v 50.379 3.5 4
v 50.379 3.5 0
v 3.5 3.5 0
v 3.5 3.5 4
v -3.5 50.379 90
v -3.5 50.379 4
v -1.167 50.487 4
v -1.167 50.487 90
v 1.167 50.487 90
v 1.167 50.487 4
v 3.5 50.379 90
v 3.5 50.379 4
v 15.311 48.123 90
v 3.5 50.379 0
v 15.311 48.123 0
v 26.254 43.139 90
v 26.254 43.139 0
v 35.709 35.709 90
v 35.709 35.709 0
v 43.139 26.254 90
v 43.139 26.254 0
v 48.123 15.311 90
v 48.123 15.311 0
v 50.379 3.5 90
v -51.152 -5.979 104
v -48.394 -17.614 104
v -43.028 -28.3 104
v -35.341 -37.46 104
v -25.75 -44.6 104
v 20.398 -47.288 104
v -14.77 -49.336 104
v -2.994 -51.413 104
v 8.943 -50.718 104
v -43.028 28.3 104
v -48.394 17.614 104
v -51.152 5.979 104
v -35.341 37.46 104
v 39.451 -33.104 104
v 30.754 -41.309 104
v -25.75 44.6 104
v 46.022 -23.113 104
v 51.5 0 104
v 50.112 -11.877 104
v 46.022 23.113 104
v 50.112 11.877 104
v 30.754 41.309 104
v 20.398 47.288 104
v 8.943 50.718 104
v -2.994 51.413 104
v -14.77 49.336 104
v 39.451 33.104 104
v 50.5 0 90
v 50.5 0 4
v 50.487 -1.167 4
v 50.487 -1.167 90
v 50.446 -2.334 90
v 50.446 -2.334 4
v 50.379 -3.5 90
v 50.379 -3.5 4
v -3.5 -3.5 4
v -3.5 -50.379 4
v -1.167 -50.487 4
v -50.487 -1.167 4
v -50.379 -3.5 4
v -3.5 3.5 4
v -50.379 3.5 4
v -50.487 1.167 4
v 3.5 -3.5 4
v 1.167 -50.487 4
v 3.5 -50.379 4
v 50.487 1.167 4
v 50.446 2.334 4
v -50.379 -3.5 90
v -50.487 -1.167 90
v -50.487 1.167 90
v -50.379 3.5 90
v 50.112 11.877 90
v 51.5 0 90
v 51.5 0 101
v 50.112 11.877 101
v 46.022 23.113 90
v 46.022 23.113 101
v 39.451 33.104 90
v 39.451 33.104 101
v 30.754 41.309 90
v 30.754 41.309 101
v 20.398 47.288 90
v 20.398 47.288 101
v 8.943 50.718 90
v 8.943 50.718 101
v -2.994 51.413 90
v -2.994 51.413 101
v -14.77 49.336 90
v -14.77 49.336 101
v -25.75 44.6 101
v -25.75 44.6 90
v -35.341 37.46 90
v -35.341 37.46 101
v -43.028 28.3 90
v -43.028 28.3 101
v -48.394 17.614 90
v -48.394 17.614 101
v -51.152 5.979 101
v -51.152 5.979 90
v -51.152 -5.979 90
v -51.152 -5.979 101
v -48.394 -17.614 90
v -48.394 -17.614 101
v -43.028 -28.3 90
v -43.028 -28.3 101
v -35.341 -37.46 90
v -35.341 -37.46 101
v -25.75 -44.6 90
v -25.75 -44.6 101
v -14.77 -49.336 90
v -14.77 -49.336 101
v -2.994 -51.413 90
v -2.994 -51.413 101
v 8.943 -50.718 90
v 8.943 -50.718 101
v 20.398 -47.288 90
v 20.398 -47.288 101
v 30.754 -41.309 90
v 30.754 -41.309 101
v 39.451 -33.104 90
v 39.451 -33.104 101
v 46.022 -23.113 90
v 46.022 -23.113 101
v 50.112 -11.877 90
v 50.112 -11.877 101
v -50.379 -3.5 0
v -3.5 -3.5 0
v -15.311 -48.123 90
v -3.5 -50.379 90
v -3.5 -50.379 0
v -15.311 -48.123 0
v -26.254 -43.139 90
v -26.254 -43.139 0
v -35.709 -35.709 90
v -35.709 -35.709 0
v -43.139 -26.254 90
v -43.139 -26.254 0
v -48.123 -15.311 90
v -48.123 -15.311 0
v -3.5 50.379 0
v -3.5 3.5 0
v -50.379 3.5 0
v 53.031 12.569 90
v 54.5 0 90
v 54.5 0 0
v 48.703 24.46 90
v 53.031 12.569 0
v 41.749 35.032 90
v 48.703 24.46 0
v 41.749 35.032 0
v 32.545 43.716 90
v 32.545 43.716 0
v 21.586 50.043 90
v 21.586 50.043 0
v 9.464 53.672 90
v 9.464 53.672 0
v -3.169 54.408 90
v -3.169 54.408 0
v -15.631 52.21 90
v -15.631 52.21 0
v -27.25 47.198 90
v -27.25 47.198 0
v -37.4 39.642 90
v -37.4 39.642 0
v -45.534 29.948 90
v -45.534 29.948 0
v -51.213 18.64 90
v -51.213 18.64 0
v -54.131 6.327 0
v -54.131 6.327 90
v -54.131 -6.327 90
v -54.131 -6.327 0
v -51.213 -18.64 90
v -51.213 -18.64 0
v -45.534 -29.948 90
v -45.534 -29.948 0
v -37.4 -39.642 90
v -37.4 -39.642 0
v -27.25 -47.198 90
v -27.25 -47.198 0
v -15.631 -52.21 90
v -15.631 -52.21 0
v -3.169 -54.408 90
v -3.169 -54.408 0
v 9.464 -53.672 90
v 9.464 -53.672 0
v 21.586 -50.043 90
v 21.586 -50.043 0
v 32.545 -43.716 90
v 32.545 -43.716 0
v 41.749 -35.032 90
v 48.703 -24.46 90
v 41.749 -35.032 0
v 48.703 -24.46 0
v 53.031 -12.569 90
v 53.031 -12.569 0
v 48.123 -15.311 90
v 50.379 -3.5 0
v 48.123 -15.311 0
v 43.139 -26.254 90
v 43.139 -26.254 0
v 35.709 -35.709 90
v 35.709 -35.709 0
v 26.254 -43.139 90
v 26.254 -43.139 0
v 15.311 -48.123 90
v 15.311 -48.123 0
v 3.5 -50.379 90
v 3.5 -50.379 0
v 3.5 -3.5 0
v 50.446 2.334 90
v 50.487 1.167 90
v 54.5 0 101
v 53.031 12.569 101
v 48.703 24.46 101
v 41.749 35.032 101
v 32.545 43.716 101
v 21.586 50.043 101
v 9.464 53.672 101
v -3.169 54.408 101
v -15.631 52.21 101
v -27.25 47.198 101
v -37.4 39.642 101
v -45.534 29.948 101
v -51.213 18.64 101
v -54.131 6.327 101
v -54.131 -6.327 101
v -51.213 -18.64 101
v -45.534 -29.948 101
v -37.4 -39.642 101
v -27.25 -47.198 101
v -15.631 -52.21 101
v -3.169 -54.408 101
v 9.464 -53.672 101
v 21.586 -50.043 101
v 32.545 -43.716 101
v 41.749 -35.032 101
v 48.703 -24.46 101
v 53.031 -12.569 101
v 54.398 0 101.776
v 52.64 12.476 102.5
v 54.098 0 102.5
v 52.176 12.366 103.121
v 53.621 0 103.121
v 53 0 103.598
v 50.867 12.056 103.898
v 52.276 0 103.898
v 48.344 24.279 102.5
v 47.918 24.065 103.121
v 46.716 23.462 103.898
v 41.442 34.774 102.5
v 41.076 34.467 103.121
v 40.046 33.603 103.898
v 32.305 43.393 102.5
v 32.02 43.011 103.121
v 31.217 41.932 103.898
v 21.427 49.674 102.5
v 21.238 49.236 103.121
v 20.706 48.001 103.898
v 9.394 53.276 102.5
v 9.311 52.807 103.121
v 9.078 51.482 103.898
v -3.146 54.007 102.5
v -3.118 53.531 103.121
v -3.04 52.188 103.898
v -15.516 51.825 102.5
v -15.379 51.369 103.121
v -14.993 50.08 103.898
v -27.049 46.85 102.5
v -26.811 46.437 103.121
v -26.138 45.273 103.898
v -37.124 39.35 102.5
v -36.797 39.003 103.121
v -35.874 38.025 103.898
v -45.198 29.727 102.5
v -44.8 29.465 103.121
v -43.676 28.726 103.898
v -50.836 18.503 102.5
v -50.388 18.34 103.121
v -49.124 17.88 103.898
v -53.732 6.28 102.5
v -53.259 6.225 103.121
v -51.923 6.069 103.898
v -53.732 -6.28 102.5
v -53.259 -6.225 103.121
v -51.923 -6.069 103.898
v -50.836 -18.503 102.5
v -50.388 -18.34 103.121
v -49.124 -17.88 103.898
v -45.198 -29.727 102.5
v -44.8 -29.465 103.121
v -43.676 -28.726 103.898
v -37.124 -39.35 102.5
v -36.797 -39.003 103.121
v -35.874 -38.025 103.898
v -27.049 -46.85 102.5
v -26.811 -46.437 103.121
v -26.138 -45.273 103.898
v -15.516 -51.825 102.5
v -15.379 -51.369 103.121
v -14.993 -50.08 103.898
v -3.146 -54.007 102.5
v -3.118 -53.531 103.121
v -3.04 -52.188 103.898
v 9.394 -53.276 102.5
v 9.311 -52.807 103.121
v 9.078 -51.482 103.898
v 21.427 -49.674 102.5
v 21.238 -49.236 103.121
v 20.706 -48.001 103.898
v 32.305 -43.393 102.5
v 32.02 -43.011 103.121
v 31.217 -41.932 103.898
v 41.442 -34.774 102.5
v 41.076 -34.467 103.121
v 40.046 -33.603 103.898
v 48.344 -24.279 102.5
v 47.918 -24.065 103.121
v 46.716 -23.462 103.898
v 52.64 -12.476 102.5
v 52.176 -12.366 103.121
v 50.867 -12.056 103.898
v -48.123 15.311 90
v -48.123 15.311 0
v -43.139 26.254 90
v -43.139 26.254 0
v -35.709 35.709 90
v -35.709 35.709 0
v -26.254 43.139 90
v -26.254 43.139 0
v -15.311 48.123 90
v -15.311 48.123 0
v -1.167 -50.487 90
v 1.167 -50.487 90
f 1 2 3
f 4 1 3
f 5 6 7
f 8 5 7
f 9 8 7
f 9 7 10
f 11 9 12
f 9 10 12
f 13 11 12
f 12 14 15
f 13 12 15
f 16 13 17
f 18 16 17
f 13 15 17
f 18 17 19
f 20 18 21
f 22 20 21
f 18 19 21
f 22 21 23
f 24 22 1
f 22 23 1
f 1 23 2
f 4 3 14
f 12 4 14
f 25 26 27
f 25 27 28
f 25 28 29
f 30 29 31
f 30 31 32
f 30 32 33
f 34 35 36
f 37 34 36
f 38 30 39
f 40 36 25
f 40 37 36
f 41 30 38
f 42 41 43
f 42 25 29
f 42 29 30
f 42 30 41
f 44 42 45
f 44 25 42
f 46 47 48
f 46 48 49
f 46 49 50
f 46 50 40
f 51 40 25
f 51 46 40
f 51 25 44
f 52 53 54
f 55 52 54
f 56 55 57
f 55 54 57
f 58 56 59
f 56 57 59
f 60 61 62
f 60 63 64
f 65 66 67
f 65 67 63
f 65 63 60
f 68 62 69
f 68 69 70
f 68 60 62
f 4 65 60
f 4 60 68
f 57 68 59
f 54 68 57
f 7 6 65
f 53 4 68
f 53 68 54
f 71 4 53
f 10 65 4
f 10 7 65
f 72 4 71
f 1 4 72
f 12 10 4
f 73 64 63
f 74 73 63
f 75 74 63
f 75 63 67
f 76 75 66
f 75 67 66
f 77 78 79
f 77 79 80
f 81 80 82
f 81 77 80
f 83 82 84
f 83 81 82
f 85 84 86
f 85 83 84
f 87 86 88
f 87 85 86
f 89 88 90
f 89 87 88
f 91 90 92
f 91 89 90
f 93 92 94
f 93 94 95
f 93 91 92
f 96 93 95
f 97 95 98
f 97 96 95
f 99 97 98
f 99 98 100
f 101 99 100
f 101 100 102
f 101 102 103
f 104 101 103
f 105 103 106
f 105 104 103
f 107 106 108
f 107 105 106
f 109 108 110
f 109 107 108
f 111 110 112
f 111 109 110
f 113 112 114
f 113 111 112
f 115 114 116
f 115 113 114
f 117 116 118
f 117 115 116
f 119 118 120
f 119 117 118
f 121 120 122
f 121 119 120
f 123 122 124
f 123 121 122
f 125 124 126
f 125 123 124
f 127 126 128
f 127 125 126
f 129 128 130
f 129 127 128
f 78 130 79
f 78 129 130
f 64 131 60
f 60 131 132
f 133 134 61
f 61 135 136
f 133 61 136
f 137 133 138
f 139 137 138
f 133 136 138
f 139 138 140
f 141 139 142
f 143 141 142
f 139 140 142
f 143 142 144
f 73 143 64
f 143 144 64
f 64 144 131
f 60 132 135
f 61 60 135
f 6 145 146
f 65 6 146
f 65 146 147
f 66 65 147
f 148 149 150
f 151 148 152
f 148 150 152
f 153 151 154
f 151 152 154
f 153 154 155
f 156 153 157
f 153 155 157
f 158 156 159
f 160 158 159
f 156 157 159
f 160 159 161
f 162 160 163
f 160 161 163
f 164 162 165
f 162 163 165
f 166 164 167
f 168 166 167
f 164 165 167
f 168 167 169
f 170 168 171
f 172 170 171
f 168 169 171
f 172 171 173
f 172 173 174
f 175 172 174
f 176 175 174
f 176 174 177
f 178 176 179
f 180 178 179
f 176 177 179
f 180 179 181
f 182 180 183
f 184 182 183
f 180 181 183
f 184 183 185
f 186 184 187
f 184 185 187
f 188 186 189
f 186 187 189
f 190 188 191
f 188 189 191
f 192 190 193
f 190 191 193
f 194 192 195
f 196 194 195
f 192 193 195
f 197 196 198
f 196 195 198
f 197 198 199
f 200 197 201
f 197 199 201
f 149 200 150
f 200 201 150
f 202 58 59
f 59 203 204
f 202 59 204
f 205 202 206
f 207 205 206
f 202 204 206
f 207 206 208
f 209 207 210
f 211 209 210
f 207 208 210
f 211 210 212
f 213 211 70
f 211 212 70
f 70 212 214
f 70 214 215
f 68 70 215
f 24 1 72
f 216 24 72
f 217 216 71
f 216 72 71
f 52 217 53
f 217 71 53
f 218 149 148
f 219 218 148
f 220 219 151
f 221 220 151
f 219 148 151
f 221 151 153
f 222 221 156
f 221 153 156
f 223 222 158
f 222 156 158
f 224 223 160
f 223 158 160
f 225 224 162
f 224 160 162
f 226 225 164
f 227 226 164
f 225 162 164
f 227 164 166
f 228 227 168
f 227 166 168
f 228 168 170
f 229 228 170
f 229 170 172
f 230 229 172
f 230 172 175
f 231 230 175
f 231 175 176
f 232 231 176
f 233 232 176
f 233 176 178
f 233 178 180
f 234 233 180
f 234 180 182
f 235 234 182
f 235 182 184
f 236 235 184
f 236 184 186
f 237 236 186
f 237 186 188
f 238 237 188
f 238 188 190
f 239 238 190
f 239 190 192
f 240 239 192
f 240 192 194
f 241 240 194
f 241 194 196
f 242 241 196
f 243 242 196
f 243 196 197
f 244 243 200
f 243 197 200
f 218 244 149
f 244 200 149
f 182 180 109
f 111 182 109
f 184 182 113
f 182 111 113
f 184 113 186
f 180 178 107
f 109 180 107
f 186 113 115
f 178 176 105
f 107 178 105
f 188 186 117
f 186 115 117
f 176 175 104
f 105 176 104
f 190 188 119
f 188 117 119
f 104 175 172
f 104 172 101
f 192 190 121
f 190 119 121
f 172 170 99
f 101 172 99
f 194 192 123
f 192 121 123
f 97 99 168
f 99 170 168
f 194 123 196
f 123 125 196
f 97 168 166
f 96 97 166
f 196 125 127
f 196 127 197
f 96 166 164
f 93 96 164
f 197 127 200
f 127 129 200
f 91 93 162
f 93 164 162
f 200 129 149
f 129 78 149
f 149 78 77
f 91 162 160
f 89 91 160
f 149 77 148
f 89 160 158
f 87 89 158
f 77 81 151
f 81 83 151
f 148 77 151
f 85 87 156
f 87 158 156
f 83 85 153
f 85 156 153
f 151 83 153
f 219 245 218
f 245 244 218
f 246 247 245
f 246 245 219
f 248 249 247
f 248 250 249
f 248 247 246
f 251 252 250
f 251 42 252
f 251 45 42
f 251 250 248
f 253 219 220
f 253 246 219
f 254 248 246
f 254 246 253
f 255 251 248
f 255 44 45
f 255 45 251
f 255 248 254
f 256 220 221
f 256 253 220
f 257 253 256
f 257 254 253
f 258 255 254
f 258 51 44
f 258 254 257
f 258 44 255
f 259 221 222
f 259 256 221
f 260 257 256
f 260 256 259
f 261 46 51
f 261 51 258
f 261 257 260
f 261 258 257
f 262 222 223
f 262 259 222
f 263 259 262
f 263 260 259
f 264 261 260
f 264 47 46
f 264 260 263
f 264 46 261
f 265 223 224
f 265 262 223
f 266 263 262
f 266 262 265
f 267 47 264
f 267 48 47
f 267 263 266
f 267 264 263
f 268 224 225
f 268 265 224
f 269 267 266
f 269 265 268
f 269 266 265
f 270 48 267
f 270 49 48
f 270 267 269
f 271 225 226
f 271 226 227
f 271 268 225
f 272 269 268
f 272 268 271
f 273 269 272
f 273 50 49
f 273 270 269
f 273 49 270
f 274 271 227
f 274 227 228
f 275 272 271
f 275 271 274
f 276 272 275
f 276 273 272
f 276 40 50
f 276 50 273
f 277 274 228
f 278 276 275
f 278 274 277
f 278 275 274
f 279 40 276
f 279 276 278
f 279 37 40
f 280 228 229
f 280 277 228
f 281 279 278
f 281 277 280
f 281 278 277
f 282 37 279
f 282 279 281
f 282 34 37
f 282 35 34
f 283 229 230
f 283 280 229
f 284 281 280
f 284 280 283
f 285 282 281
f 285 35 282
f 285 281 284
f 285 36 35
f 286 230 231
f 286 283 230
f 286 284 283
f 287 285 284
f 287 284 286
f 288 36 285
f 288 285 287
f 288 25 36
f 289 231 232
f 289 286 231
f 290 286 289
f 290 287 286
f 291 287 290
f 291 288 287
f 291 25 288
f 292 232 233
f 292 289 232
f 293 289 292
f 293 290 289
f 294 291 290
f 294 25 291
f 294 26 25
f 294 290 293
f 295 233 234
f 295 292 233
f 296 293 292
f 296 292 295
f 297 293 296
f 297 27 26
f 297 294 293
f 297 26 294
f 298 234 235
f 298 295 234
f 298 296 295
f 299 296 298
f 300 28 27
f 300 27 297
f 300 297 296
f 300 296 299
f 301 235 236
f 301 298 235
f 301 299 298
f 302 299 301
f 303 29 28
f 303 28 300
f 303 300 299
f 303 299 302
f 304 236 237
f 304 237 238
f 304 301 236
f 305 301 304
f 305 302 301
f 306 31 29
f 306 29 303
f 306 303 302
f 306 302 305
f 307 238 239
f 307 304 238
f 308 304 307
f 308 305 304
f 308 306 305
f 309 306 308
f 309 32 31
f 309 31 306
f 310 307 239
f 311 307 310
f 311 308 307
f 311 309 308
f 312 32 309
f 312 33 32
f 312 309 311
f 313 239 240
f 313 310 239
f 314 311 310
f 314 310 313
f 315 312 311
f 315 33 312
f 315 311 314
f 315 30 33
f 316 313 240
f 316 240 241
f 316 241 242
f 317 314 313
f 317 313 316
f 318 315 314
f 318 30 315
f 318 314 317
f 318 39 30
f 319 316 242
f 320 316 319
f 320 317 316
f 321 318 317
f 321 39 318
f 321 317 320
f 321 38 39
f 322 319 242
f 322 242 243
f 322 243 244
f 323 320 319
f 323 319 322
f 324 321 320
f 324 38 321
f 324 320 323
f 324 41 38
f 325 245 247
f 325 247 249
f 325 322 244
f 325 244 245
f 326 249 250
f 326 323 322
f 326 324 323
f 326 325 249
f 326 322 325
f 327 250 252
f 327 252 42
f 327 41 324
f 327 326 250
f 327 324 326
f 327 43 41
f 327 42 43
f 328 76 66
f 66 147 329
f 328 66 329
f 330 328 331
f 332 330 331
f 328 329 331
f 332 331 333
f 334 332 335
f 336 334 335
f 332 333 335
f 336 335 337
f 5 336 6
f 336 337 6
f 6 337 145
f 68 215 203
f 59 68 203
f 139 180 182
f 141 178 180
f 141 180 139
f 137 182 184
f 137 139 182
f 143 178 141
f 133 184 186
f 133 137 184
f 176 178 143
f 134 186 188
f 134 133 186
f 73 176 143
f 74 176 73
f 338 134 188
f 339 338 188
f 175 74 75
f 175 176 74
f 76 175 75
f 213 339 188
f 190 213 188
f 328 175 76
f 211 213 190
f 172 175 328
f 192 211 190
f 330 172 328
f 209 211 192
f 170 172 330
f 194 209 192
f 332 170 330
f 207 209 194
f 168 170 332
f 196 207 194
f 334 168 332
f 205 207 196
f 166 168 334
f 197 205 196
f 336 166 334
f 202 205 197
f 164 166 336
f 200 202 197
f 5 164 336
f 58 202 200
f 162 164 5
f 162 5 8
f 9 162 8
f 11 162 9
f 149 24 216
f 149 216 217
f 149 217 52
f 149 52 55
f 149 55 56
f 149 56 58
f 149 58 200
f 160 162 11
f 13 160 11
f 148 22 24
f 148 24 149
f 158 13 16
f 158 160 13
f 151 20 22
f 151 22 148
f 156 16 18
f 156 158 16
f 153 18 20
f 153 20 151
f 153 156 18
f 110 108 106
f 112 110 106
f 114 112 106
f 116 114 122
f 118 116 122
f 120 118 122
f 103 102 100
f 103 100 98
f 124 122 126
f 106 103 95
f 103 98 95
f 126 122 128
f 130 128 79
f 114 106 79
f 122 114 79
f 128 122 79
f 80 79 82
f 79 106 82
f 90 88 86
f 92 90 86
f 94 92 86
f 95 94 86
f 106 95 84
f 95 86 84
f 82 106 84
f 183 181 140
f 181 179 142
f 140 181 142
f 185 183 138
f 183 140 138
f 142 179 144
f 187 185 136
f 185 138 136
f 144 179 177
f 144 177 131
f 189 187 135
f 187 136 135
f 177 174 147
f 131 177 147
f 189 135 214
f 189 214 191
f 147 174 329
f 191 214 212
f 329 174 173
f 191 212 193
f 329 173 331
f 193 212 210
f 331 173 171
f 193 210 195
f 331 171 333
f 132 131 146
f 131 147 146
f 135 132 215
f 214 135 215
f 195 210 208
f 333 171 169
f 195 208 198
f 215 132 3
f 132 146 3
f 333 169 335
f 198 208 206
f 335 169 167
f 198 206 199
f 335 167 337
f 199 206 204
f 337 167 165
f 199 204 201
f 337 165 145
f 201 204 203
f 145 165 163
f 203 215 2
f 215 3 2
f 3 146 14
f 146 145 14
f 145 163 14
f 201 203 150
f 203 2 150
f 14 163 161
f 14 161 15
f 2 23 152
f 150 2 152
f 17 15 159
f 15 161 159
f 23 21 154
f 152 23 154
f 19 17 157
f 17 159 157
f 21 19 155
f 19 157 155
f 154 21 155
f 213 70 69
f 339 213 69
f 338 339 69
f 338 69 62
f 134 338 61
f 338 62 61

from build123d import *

# Parameters (mm, degrees)
F0_R     = 54.5
F1_DEPTH = 90
F0_W     = 7
F0_H     = 7
F2_DEPTH = 4
F3_R     = 54.5
F3_R_2   = 51.5
F4_DEPTH = 11
F5_R     = 54.5
F5_R_2   = 51.5
F5_R_3   = 48.5912547039
F6_DEPTH = 3
F7_R     = 3


# Not quite as in the source:
# - a feature of the source that left no trace in its solid (it failed there, or was rolled back) is left out


with BuildPart() as f1:
    # F0 (on Top) → F1 (new body)
    with BuildSketch(Plane.XY):
        Circle(F0_R)
        with BuildLine():
            ThreePointArc((50.3785668712, 3.5), (50.4696325873, 1.7510529693), (50.5, 0))
            ThreePointArc((50.5, 0), (50.4696325873, -1.7510529693), (50.3785668712, -3.5))
            ThreePointArc((50.3785668712, -3.5), (35.7088924499, -35.7088924499), (3.5, -50.3785668712))
            ThreePointArc((3.5, -50.3785668712), (0, -50.5), (-3.5, -50.3785668712))
            ThreePointArc((-3.5, -50.3785668712), (-35.7088924499, -35.7088924499), (-50.3785668712, -3.5))
            ThreePointArc((-50.3785668712, -3.5), (-50.5, 0), (-50.3785668712, 3.5))
            ThreePointArc((-50.3785668712, 3.5), (-35.7088924499, 35.7088924499), (-3.5, 50.3785668712))
            ThreePointArc((-3.5, 50.3785668712), (0, 50.5), (3.5, 50.3785668712))
            ThreePointArc((3.5, 50.3785668712), (35.7088924499, 35.7088924499), (50.3785668712, 3.5))
        make_face(mode=Mode.SUBTRACT)
    extrude(amount=F1_DEPTH)

    # F0 (on Top) → F2 (join)
    with BuildSketch(Plane.XY):
        Rectangle(F0_W, F0_H)
        with BuildLine():
            ThreePointArc((-3.5, -50.3785668712), (0, -50.5), (3.5, -50.3785668712))
            Line((3.5, -50.3785668712), (3.5, -3.5))
            Line((3.5, -3.5), (-3.5, -3.5))
            Line((-3.5, -3.5), (-3.5, -50.3785668712))
        make_face()
        with BuildLine():
            ThreePointArc((50.3785668712, -3.5), (50.4696325873, -1.7510529693), (50.5, 0))
            ThreePointArc((50.5, 0), (50.4696325873, 1.7510529693), (50.3785668712, 3.5))
            Line((50.3785668712, 3.5), (3.5, 3.5))
            Line((3.5, 3.5), (3.5, -3.5))
            Line((3.5, -3.5), (50.3785668712, -3.5))
        make_face()
        with BuildLine():
            Line((3.5, 3.5), (3.5, 50.3785668712))
            ThreePointArc((3.5, 50.3785668712), (0, 50.5), (-3.5, 50.3785668712))
            Line((-3.5, 50.3785668712), (-3.5, 3.5))
            Line((-3.5, 3.5), (3.5, 3.5))
        make_face()
        with BuildLine():
            Line((-3.5, -3.5), (-3.5, 3.5))
            Line((-3.5, 3.5), (-50.3785668712, 3.5))
            ThreePointArc((-50.3785668712, 3.5), (-50.5, 0), (-50.3785668712, -3.5))
            Line((-50.3785668712, -3.5), (-3.5, -3.5))
        make_face()
    extrude(amount=F2_DEPTH)


with BuildPart() as f4:
    # F3 (on face) → F4 (new body)
    with BuildSketch(Plane.XY.offset(90)):
        Circle(F3_R)
        Circle(F3_R_2, mode=Mode.SUBTRACT)
    extrude(amount=F4_DEPTH)

    # F5 (on face) → F6 (join)
    with BuildSketch(Plane.XY.offset(101)):
        Circle(F5_R)
        Circle(F5_R_2, mode=Mode.SUBTRACT)
        Circle(F5_R_2)
        Circle(F5_R_3, mode=Mode.SUBTRACT)
        Circle(F5_R_3)
    extrude(amount=F6_DEPTH)

    # F7
    f7_edges = [f4.edges().sort_by_distance(p)[0] for p in [
        (-54.5, 0, 104),
    ]]
    fillet(f7_edges, radius=F7_R)


solid = Compound([f1.part, f4.part])
